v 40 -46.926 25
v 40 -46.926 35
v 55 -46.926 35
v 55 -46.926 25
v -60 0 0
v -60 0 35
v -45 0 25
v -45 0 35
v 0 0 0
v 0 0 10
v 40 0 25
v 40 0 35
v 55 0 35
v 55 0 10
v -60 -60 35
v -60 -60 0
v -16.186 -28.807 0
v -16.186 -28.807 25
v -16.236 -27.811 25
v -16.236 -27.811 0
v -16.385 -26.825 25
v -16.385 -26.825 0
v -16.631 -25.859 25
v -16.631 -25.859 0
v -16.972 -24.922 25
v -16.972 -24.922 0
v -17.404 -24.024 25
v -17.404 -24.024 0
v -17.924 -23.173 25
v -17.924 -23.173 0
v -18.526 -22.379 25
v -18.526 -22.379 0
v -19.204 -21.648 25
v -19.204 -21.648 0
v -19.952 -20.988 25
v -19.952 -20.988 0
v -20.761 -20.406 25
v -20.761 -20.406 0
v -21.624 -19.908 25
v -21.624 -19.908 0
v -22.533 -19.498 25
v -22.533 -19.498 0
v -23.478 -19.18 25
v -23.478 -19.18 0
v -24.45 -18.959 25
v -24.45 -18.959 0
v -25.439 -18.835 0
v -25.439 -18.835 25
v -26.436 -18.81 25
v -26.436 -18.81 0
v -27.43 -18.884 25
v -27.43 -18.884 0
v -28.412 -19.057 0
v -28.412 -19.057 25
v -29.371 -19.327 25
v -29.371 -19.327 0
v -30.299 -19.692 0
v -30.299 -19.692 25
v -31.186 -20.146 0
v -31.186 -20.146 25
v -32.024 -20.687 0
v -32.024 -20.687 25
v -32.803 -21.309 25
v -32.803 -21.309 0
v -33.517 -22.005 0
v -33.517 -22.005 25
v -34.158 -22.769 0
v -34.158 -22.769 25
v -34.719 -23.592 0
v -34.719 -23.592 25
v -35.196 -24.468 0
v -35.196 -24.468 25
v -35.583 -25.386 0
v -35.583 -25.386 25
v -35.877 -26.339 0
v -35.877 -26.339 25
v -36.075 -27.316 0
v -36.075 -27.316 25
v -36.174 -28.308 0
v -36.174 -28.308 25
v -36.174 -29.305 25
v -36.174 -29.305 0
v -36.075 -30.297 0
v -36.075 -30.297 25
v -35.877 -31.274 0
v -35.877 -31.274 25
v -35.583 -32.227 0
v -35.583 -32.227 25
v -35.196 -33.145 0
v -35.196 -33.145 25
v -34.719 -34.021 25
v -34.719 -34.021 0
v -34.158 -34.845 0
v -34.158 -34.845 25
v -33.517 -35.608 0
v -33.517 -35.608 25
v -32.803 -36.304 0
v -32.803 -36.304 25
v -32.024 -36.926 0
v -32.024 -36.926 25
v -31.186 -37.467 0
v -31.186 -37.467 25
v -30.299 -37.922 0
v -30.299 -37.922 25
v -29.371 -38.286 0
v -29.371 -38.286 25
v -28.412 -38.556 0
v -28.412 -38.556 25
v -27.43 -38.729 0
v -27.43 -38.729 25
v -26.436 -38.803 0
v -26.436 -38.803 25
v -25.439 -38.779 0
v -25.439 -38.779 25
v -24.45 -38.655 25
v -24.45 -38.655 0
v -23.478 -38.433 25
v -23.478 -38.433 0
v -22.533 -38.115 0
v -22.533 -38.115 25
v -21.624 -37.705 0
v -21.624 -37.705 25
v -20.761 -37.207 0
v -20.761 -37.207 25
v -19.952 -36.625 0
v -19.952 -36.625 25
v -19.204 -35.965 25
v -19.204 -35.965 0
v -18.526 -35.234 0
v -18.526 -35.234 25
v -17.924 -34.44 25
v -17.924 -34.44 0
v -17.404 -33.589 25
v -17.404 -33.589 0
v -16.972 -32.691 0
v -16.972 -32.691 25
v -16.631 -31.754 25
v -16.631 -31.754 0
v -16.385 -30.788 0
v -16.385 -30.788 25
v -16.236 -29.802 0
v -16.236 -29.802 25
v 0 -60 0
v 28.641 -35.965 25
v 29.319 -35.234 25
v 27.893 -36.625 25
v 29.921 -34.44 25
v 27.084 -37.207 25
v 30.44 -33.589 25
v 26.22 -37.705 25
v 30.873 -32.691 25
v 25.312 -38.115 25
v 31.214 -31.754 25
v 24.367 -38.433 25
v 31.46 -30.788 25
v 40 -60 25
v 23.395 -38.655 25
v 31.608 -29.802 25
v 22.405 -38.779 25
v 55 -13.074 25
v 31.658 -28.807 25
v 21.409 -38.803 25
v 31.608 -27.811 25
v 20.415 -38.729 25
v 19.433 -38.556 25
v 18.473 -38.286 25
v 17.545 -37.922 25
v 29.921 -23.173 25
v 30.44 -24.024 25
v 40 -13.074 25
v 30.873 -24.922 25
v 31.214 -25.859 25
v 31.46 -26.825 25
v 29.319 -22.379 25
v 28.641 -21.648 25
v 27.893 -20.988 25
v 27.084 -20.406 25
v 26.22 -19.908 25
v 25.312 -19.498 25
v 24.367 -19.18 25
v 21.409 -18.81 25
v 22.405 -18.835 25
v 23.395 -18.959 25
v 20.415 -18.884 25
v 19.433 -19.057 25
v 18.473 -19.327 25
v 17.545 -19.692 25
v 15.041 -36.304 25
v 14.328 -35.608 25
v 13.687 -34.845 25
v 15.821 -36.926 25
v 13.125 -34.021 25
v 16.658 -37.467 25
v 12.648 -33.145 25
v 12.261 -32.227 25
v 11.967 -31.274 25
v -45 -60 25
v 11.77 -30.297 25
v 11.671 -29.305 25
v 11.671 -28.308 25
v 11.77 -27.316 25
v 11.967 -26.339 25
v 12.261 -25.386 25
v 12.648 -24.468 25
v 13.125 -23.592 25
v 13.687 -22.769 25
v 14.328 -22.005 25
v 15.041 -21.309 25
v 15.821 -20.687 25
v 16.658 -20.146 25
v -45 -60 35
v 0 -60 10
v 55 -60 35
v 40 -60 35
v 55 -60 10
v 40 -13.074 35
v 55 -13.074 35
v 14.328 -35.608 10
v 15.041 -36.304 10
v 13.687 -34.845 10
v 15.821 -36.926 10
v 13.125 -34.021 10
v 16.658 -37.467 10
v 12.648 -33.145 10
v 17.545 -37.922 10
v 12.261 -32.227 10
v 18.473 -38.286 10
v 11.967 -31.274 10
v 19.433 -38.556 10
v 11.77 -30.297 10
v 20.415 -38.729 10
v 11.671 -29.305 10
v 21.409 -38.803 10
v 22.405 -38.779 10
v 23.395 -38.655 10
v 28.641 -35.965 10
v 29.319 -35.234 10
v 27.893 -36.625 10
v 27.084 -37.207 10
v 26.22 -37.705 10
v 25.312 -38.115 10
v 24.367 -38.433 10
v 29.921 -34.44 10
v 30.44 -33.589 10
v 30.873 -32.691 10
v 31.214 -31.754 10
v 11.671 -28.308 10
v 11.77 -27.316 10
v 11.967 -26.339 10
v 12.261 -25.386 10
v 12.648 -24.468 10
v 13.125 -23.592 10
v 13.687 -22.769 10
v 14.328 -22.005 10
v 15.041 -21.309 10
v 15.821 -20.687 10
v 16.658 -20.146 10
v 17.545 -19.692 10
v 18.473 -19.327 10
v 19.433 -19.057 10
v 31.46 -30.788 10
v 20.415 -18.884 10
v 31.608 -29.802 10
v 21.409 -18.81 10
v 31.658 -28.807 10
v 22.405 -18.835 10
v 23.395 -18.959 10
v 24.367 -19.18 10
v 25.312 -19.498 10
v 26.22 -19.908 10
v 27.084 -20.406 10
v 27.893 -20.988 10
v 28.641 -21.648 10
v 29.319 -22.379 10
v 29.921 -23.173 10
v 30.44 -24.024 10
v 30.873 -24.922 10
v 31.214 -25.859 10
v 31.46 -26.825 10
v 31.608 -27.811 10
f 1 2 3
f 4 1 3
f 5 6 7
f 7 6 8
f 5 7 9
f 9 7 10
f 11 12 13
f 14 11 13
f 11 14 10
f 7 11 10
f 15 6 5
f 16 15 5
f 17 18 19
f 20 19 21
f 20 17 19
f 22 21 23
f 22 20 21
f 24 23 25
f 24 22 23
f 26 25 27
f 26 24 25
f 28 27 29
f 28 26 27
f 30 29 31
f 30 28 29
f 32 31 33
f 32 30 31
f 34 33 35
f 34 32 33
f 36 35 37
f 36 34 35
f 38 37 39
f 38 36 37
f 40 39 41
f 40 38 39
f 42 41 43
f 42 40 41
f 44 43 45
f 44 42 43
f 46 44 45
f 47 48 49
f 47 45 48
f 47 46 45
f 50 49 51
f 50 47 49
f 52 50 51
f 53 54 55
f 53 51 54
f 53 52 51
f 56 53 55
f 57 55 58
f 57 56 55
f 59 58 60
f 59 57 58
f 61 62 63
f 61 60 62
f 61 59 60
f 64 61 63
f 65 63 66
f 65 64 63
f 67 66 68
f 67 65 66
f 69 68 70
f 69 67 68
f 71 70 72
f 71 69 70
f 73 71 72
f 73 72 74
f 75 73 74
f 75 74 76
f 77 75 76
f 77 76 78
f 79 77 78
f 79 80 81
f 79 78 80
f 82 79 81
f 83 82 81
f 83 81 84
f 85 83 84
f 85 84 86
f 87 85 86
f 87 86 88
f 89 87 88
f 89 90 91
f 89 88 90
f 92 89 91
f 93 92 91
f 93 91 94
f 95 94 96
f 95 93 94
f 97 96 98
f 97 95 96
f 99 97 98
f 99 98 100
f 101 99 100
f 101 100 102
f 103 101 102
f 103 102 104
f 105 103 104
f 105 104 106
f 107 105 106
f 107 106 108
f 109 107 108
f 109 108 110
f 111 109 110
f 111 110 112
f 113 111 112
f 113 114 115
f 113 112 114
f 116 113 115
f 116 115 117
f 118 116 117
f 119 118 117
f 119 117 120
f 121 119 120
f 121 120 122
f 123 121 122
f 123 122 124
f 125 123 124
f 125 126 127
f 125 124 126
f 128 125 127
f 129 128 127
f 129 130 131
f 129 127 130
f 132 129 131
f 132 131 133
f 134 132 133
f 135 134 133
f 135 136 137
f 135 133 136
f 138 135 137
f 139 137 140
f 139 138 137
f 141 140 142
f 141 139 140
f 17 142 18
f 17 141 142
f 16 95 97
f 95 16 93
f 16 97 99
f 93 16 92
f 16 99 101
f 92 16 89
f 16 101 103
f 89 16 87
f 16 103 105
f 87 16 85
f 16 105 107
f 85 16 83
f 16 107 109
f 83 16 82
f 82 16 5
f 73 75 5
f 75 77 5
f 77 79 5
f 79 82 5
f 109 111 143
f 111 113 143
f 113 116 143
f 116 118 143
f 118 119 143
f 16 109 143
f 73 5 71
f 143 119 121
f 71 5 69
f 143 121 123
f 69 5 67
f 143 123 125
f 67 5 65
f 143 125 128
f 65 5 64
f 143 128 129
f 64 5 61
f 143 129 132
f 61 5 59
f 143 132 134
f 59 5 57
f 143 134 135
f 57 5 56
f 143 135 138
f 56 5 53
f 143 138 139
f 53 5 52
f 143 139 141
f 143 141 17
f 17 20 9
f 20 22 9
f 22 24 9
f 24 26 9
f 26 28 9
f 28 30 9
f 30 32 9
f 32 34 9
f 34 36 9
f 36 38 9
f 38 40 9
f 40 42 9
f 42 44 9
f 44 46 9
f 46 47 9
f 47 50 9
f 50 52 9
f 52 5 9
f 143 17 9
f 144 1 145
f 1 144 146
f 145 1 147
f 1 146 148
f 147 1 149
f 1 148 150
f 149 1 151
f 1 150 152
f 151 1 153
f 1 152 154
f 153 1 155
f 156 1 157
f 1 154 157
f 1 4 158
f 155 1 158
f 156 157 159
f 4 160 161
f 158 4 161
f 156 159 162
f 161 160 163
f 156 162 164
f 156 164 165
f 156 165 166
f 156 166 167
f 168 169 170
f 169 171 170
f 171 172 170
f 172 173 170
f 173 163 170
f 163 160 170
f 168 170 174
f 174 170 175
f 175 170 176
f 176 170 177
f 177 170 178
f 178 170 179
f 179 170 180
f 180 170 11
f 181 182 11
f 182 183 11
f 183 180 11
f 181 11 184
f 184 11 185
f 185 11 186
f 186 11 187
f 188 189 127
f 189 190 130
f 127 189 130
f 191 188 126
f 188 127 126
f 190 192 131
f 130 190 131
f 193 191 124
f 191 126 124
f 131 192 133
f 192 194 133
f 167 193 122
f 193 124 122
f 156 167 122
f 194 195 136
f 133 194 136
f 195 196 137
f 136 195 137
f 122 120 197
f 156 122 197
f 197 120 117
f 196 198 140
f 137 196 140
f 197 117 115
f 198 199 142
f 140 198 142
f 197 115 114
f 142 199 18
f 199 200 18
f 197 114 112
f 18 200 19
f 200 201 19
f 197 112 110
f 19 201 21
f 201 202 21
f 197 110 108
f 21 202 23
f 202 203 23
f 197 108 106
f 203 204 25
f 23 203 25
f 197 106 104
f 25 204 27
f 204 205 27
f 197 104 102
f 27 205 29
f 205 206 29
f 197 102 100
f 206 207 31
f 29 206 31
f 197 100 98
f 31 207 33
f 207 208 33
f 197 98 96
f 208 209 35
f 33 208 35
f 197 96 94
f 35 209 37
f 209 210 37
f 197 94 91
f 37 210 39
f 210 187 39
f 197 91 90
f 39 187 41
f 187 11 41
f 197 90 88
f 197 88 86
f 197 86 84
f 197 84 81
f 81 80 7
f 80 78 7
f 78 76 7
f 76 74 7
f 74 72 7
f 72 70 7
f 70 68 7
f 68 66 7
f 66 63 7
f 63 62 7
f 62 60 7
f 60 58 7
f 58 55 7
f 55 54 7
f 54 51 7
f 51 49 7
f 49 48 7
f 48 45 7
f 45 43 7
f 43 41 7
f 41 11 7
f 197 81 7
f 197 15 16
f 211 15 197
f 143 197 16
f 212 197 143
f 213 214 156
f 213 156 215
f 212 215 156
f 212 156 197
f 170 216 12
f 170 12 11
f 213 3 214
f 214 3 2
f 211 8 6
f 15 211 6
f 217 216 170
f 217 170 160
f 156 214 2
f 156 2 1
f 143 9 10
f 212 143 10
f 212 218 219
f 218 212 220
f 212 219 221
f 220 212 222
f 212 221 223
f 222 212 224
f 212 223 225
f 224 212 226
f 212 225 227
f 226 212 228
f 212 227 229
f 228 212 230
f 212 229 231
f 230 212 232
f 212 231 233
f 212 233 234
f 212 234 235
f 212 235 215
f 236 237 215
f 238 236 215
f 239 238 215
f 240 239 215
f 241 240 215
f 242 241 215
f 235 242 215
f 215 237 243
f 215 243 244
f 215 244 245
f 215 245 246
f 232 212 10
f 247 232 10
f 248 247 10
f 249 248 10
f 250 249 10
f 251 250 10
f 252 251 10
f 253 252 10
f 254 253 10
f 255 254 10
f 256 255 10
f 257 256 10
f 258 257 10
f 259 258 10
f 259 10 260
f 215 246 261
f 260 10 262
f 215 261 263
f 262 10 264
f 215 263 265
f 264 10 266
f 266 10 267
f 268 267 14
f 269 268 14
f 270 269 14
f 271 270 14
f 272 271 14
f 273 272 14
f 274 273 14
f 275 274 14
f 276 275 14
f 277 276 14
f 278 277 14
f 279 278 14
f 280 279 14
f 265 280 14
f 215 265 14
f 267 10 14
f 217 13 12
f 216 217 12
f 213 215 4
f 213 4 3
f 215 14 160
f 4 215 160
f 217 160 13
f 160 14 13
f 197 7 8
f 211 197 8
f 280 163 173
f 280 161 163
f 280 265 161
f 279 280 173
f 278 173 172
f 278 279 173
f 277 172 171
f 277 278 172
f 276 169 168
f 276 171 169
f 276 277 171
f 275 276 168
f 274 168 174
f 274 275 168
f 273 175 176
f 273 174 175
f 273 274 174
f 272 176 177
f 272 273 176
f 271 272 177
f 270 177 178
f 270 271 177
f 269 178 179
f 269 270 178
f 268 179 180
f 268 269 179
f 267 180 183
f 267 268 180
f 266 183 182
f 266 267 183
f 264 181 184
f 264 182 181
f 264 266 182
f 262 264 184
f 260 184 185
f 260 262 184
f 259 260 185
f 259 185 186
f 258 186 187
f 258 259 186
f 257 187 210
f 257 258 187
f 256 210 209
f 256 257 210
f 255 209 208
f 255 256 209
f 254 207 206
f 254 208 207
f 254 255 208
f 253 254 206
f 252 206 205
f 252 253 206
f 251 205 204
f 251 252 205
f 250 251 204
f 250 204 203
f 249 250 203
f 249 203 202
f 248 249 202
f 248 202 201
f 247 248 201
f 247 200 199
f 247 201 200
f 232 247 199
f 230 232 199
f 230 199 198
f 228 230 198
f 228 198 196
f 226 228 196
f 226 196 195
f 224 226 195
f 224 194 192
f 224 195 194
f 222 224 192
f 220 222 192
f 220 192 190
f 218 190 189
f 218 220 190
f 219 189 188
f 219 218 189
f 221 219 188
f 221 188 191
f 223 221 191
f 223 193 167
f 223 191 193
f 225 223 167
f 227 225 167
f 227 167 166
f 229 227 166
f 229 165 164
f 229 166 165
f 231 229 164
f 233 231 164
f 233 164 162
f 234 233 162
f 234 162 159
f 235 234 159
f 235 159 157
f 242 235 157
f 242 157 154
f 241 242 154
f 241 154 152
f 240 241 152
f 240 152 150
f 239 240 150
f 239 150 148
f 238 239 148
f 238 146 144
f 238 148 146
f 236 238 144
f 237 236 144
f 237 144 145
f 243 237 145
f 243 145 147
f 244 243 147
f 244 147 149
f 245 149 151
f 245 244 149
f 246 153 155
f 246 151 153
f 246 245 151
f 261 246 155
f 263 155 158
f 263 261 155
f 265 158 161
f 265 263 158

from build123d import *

# Parameters (mm, degrees)
F1_DEPTH = 60
F2_R     = 10
F3_DEPTH = 34.8
F4_W     = 15
F4_H     = 33.852546
F5_DEPTH = 10


with BuildPart() as f1:
    # F0 (on Front) → F1 (new body)
    with BuildSketch(Plane.XZ):
        Polygon((-60, 35), (-60, 0), (0, 0), (0, 10), (55, 10), (55, 35), (40, 35), (40, 25), (-45, 25), (-45, 35), align=None)
    extrude(amount=F1_DEPTH)

    # F2 (on Top) → F3 (cut)
    with BuildSketch(Plane.XY):
        with Locations((-26.186485, -28.806591)):
            Circle(F2_R)
        with Locations((21.658143, -28.806591)):
            Circle(F2_R)
    extrude(amount=F3_DEPTH, mode=Mode.SUBTRACT)

    # F4 (on face) → F5 (cut)
    with BuildSketch(Plane.XY.offset(35)):
        with Locations((47.5, -30)):
            Rectangle(F4_W, F4_H)
    extrude(amount=-F5_DEPTH, mode=Mode.SUBTRACT)


solid = f1.part
